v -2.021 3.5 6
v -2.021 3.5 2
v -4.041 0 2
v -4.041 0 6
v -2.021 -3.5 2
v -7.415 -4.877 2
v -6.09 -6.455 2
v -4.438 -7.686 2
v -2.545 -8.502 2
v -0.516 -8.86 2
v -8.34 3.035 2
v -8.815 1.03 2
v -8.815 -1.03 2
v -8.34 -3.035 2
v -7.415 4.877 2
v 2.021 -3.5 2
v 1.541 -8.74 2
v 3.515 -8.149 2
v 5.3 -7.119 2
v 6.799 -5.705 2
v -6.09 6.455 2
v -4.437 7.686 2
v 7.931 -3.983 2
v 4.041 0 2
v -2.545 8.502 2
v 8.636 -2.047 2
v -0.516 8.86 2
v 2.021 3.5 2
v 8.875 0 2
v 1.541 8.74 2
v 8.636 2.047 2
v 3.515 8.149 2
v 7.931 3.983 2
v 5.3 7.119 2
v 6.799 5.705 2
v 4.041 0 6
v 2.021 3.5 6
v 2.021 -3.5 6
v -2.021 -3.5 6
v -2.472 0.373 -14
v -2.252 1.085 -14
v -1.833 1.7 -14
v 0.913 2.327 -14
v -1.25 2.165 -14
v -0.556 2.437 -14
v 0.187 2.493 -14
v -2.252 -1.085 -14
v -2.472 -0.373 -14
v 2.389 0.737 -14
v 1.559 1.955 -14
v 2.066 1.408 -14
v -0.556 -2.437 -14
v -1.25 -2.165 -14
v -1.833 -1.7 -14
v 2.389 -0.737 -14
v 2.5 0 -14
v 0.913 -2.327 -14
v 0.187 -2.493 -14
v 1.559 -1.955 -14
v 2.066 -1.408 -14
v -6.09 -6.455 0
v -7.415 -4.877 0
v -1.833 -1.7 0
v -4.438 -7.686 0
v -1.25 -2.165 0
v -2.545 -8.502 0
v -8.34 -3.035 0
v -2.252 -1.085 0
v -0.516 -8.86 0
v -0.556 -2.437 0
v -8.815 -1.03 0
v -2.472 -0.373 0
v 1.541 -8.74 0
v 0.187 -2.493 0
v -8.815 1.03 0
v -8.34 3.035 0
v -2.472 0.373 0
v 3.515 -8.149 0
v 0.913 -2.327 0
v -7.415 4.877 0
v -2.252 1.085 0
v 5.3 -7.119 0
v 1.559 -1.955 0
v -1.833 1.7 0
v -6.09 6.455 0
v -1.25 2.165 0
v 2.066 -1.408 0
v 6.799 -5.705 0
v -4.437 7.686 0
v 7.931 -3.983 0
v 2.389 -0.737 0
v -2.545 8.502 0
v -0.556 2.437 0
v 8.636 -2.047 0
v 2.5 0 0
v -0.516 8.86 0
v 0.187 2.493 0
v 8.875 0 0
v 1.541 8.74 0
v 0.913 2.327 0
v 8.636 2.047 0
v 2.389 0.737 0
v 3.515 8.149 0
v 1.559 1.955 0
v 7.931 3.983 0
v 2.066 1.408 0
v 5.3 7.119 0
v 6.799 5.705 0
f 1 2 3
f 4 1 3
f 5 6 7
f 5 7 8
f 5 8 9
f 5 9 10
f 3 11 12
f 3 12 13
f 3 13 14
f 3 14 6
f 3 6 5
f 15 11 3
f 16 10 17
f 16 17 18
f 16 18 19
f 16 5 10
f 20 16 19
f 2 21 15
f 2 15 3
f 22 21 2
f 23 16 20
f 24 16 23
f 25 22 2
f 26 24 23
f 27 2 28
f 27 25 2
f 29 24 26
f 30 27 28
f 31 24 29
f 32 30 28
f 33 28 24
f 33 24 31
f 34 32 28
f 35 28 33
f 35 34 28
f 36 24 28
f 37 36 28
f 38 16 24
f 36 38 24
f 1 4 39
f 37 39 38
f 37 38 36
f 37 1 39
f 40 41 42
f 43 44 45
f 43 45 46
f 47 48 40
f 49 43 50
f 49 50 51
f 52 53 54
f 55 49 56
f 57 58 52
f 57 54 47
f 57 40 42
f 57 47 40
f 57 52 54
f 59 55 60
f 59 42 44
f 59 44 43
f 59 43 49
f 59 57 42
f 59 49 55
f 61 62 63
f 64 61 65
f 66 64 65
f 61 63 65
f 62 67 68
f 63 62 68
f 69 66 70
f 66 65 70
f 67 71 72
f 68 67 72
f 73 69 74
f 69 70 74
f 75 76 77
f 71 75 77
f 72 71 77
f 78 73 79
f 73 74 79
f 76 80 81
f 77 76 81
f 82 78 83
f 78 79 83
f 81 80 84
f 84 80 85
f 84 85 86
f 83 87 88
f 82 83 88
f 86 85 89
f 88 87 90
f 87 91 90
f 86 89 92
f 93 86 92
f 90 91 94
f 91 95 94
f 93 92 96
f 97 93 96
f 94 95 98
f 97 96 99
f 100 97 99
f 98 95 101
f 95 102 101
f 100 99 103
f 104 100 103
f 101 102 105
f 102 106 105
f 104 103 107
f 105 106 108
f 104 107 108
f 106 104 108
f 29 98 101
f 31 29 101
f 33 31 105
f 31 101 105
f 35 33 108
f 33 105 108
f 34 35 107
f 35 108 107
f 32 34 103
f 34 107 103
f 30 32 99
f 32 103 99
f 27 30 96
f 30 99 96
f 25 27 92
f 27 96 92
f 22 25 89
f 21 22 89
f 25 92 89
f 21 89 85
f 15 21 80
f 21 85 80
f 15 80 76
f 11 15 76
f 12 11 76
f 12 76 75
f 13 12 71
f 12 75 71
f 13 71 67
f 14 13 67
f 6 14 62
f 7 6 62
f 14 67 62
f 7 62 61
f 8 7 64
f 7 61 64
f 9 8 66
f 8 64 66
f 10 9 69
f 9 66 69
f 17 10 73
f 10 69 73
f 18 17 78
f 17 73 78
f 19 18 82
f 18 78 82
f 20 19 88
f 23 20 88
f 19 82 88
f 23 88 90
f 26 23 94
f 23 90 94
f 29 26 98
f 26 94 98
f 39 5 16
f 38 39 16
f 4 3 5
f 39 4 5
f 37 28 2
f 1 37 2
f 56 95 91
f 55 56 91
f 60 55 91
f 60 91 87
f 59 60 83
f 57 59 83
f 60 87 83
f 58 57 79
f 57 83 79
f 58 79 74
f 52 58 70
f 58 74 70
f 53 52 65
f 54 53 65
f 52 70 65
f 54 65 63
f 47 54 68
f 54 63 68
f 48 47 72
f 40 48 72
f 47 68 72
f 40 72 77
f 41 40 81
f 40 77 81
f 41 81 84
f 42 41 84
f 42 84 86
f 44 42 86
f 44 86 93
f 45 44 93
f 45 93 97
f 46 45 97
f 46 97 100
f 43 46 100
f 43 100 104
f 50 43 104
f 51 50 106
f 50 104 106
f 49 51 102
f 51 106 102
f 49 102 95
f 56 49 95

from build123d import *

# Parameters (mm, degrees)
F0_R     = 8.875
F1_DEPTH = 2
F2_R     = 2.5
F3_DEPTH = 14
F5_DEPTH = 4


with BuildPart() as f1:
    # F0 (on Top) → F1 (new body)
    with BuildSketch(Plane.XY):
        Circle(F0_R)
    extrude(amount=F1_DEPTH)

    # F2 (on face) → F3 (join)
    with BuildSketch(Plane(origin=(0, 0, 0), x_dir=(1, 0, 0), z_dir=(0, 0, -1))):
        Circle(F2_R)
    extrude(amount=F3_DEPTH)

    # F4 (on face) → F5 (join)
    with BuildSketch(Plane.XY.offset(2)):
        Polygon((-4.041452, 0), (-2.020726, -3.5), (2.020726, -3.5), (4.041452, 0), (2.020726, 3.5), (-2.020726, 3.5), align=None)
    extrude(amount=F5_DEPTH)


solid = f1.part
